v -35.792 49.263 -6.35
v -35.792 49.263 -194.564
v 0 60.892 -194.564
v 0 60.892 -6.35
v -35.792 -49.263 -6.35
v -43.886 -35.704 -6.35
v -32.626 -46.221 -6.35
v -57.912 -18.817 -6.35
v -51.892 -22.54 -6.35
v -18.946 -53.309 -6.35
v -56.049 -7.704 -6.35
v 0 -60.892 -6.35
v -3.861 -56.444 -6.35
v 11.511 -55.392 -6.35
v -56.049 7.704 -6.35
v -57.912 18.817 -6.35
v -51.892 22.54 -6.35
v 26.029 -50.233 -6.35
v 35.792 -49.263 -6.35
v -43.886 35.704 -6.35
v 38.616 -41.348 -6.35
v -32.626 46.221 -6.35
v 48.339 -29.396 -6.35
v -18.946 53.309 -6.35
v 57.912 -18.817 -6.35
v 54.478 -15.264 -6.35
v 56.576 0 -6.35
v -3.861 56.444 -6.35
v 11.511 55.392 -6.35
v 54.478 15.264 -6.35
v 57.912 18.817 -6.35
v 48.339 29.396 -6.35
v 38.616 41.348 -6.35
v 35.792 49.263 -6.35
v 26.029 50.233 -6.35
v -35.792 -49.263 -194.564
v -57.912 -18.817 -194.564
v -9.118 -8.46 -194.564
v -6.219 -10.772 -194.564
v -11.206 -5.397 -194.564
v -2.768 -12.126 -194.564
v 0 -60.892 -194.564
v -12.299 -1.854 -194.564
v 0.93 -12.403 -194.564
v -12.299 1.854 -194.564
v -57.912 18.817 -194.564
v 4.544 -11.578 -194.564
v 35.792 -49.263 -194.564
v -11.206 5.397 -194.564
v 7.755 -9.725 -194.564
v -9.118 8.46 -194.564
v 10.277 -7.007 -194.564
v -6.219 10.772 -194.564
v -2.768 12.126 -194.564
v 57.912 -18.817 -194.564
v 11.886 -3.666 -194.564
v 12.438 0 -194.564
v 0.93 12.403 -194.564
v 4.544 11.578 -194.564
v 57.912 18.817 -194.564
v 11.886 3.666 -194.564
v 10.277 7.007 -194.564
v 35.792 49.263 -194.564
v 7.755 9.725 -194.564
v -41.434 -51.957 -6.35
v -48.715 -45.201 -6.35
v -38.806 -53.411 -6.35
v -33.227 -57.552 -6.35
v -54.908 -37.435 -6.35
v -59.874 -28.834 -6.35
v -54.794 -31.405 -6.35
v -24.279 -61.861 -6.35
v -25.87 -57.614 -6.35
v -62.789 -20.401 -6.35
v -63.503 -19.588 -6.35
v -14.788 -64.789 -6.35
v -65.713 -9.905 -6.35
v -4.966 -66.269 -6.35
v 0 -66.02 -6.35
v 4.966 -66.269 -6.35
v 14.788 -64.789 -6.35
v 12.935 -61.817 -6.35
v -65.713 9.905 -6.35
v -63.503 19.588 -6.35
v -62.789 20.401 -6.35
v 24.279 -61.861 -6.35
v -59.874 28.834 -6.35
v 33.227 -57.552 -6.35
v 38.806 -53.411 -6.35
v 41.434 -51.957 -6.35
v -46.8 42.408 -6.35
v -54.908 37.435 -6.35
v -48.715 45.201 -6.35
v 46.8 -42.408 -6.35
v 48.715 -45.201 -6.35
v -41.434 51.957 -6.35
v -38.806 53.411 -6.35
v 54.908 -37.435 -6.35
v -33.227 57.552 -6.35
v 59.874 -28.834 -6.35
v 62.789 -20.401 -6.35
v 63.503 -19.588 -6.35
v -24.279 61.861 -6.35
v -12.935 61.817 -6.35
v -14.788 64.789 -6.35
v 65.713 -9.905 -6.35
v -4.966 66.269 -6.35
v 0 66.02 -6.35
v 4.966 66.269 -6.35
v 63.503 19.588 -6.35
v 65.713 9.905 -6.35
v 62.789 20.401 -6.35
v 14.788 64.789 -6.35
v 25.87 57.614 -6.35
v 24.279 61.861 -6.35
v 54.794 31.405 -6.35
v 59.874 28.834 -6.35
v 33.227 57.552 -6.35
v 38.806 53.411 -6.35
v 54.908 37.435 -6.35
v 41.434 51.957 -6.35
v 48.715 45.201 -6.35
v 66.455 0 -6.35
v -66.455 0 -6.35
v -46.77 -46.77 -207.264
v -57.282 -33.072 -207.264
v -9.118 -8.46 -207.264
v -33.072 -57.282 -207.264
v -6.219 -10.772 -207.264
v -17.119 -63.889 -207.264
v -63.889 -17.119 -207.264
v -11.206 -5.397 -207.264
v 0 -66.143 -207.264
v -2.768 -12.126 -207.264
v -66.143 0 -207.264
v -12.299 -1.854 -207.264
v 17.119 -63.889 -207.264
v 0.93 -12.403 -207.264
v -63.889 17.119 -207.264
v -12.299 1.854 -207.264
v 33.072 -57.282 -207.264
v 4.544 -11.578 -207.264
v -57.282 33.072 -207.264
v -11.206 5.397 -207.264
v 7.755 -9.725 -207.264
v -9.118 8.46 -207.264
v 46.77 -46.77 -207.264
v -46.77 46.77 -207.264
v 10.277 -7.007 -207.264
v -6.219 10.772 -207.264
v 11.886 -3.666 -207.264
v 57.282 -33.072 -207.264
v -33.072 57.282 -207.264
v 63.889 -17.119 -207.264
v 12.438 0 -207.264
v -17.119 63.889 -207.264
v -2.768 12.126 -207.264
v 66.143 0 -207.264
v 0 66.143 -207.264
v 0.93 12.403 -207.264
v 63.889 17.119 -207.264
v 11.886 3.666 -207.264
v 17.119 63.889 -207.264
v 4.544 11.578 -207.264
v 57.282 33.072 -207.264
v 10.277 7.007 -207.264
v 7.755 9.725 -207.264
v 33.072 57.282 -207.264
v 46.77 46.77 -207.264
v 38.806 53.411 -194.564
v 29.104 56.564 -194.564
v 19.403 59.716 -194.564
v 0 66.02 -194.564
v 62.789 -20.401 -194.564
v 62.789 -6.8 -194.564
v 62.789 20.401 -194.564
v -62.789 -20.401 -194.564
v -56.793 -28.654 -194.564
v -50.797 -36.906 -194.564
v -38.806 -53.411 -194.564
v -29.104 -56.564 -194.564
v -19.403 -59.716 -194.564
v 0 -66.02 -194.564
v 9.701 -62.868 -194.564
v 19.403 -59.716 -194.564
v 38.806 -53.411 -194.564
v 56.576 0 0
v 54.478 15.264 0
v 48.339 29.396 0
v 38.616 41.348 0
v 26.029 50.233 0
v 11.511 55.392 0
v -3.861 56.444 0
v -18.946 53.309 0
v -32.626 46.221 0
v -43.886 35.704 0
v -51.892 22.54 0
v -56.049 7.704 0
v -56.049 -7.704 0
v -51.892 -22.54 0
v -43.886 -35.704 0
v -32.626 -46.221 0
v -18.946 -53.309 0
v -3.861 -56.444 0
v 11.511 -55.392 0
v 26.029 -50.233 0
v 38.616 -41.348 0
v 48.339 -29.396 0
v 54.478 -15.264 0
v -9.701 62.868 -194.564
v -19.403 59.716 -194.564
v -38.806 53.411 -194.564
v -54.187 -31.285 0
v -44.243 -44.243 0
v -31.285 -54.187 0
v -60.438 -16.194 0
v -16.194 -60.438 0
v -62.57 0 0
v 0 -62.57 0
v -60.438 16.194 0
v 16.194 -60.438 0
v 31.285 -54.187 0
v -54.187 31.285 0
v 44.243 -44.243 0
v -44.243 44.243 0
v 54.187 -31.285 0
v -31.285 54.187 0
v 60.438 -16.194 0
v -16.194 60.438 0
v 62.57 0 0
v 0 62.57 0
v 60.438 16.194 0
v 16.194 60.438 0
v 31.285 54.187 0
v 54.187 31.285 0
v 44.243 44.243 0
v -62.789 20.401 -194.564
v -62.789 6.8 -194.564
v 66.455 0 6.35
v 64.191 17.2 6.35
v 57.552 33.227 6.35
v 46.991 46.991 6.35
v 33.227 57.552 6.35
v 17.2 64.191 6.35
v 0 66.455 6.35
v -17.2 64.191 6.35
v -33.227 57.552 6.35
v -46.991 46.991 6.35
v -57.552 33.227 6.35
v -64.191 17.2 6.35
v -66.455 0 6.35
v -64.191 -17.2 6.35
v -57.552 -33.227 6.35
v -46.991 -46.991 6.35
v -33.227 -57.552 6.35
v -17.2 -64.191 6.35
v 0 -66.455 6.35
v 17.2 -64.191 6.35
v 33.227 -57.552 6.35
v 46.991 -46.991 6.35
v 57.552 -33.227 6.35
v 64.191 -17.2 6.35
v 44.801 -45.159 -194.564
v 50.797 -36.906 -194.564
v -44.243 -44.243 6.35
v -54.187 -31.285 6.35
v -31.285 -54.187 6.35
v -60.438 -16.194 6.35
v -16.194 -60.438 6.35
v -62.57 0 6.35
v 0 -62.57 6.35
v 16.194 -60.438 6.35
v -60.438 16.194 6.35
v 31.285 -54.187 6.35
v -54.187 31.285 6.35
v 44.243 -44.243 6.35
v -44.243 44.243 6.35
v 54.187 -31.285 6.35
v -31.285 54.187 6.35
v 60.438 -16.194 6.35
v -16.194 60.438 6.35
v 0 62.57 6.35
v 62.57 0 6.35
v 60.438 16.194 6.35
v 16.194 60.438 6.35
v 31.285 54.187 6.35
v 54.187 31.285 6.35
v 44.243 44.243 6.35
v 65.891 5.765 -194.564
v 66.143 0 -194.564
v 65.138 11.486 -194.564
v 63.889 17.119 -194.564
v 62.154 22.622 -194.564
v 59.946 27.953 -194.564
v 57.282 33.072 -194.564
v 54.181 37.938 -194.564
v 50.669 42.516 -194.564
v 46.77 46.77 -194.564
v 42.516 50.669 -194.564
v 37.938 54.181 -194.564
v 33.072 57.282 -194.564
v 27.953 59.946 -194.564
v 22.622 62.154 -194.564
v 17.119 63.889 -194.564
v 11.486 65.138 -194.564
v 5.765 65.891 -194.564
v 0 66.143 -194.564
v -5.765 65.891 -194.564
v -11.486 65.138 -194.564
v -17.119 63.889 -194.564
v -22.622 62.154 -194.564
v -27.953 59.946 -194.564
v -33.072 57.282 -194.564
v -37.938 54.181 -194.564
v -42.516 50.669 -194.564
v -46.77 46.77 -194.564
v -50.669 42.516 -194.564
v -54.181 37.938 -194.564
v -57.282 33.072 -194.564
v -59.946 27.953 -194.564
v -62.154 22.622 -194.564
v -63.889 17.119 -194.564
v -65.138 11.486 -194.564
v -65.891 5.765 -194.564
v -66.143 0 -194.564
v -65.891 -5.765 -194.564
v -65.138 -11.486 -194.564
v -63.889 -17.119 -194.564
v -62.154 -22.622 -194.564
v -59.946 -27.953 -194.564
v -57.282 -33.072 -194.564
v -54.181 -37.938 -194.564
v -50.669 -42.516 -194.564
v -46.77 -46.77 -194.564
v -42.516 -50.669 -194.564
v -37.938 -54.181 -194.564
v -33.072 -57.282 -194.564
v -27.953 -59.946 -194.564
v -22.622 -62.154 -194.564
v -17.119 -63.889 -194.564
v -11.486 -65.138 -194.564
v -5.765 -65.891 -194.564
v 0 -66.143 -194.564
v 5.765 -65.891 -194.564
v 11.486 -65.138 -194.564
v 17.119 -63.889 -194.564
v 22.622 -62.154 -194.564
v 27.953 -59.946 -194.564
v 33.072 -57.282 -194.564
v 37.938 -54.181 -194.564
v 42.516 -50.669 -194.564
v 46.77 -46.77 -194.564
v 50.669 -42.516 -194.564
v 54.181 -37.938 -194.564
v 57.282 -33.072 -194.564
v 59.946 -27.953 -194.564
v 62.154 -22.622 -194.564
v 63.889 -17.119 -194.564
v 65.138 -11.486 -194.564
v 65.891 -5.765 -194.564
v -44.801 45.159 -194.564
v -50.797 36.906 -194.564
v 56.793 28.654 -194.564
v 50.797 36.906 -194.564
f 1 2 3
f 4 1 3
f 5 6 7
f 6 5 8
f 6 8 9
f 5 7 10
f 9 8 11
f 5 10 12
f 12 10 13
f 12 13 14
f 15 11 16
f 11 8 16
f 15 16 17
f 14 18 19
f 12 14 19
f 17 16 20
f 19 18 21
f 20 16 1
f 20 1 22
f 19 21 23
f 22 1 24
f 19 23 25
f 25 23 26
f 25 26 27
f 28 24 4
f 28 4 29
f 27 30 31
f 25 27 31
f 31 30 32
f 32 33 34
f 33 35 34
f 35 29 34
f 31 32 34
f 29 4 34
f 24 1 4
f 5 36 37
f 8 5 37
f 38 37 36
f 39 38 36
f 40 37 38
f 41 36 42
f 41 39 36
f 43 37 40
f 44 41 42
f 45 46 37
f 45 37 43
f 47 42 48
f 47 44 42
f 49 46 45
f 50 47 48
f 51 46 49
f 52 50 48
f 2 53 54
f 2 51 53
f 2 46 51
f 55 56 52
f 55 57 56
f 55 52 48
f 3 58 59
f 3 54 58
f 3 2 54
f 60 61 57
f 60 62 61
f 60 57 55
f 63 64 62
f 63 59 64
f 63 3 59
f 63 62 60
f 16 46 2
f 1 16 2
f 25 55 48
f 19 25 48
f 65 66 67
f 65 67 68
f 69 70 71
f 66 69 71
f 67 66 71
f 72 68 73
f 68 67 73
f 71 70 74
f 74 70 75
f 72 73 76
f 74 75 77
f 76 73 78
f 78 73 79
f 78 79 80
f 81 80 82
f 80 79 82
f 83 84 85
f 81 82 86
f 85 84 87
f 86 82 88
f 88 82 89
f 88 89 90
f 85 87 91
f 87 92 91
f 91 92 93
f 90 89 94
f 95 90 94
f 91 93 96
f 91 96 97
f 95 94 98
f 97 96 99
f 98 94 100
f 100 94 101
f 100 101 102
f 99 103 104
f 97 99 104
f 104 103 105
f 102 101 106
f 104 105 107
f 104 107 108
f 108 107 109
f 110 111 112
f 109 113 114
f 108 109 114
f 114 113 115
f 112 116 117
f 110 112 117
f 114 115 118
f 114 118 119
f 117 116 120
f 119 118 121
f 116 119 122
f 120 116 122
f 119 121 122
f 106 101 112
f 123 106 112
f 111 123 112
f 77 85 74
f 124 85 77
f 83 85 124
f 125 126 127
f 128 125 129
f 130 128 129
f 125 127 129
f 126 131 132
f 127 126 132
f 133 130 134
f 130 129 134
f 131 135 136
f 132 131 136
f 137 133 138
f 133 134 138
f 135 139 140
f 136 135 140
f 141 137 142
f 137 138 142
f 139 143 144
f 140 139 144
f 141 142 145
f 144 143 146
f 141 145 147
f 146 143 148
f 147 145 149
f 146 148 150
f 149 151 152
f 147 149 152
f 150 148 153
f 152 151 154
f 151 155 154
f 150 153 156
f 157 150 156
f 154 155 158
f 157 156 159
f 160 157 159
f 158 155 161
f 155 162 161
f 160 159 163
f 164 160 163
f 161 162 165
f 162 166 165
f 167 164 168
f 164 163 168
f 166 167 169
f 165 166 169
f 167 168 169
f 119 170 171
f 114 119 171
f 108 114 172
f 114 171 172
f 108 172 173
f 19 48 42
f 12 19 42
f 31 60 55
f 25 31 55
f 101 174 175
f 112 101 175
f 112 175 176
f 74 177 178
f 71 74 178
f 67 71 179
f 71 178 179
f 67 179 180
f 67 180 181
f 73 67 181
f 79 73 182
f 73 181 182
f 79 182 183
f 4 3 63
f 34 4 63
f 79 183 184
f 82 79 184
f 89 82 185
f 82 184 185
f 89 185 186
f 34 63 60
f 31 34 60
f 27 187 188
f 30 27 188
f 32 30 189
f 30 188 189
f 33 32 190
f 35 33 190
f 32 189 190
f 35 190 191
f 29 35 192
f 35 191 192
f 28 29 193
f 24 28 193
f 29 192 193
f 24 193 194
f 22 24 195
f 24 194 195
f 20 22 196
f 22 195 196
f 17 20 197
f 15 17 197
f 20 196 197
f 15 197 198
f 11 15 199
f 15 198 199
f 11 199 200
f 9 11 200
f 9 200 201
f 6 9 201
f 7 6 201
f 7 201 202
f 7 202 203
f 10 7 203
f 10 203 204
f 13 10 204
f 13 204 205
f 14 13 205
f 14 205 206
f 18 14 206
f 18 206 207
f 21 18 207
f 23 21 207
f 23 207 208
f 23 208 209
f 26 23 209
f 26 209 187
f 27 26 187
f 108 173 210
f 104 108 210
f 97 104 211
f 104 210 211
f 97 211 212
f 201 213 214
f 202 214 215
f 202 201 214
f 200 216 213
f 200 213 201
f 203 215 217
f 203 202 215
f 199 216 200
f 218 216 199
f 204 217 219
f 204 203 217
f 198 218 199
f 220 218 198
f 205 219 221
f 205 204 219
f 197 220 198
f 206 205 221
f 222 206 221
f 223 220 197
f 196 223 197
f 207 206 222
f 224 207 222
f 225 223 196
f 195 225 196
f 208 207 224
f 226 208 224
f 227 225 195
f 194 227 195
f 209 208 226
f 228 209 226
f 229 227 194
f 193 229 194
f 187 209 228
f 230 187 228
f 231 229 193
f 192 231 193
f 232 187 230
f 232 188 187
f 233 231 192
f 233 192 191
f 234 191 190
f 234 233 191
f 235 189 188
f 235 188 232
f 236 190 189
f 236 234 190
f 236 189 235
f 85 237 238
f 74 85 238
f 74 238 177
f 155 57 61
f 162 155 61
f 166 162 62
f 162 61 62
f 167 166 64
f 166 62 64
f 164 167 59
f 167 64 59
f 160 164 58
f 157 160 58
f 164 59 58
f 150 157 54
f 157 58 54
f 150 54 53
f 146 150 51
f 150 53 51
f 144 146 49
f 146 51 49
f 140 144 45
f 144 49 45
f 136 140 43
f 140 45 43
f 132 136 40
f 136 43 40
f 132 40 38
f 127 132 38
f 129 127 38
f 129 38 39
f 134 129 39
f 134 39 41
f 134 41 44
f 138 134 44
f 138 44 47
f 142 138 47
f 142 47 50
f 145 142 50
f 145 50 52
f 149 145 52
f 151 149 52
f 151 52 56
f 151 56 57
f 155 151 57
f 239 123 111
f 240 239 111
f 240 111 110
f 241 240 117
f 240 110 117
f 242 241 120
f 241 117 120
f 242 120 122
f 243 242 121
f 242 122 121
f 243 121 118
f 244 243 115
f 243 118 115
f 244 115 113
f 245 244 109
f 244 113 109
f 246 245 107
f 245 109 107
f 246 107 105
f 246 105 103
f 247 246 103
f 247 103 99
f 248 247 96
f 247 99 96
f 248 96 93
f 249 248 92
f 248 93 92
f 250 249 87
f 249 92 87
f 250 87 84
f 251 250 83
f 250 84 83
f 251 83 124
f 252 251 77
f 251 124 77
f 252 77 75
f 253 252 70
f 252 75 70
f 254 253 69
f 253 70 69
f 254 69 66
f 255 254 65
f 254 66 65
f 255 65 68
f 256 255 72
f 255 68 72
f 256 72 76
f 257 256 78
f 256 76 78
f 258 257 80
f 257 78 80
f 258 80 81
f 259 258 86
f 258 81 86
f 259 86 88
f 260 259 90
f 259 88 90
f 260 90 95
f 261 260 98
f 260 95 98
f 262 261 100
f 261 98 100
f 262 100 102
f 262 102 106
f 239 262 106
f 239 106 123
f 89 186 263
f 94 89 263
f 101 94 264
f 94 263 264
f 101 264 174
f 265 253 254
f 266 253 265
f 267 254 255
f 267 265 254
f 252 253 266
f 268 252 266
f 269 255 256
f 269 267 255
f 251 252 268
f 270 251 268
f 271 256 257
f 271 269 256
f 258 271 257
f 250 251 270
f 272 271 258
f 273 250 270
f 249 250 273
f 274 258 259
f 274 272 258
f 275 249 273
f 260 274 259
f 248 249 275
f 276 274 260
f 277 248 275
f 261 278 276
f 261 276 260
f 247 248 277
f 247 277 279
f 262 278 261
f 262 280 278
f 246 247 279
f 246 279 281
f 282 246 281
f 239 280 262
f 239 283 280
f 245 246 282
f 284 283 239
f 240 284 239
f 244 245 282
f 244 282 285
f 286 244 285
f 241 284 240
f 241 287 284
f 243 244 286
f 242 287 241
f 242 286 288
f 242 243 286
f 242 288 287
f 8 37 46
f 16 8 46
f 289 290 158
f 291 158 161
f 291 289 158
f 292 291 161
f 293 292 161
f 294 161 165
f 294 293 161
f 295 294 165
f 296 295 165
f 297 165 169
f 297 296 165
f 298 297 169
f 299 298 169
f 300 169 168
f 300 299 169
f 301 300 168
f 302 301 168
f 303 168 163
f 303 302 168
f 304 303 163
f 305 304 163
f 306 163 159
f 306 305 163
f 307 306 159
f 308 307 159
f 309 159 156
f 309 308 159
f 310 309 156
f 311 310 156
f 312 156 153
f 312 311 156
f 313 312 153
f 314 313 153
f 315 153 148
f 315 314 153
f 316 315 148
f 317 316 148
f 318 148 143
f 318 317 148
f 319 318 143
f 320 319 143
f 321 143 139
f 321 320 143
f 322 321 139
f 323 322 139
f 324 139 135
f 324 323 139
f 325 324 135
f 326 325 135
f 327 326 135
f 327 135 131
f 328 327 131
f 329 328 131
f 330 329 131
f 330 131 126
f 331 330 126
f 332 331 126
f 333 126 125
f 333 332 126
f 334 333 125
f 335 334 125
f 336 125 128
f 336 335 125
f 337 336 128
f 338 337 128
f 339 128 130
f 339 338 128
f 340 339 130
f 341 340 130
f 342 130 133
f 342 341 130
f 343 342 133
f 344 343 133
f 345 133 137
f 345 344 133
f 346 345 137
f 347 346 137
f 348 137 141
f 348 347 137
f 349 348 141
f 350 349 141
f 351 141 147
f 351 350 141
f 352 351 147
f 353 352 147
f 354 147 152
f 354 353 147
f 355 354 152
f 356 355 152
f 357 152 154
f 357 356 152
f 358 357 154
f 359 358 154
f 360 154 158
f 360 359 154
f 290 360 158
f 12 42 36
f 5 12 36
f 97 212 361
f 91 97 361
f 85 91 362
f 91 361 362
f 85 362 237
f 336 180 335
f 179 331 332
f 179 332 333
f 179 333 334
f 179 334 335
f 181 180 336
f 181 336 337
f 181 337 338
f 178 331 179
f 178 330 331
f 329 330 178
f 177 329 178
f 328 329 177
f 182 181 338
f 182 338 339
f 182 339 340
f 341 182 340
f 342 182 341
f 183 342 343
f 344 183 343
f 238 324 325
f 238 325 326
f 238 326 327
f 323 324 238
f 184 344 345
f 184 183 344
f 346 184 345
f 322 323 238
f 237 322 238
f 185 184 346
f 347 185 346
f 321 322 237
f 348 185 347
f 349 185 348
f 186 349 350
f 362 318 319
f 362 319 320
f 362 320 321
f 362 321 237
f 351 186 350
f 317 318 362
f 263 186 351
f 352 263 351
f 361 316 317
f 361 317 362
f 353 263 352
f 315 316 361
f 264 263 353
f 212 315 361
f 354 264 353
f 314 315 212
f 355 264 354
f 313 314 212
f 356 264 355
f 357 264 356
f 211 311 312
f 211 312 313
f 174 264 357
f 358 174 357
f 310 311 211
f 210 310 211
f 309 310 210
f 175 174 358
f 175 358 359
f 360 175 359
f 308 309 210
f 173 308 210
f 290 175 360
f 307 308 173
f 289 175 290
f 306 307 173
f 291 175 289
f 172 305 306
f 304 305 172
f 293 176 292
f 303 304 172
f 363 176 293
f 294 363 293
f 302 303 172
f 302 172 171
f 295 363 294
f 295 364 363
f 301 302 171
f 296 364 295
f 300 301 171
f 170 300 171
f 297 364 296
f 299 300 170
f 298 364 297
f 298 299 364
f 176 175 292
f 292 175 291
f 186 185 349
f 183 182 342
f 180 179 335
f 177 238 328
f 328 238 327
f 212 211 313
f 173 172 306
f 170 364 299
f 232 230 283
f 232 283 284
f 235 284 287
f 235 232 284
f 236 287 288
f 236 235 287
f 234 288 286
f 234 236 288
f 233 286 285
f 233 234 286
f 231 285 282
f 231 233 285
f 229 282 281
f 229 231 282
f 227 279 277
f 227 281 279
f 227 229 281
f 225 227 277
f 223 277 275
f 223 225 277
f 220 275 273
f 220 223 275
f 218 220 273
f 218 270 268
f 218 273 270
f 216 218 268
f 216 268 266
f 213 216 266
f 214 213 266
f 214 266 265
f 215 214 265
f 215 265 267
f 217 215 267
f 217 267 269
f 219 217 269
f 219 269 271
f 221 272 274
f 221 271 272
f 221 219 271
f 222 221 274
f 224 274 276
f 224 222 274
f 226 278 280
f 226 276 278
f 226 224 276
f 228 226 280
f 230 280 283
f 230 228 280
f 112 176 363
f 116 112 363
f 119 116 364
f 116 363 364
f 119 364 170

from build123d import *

# Parameters (mm, degrees)
F1_DEPTH  = 188.214
F2_R      = 66.1431803404
F3_DEPTH  = 12.7
F5_R      = 66.454962085
F6_DEPTH  = 12.7
F8_R      = 62.5696194111
F9_DEPTH  = 25.4
F10_R     = 56.575713998
F11_DEPTH = 25.4
F13_R     = 12.4381186973
F14_DEPTH = 25.4


with BuildPart() as f1:
    # F0 (on Top) → F1 (new body)
    with BuildSketch(Plane.XY):
        Polygon((62.7887994051, -20.4013176295), (62.7887994051, 20.4013176295), (38.8056121451, 53.4113429694), (0, 66.0200506797), (-38.8056121451, 53.4113429694), (-62.7887994051, 20.4013176295), (-62.7887994051, -20.4013176295), (-38.8056121451, -53.4113429694), (0, -66.0200506797), (38.8056121451, -53.4113429694), align=None)
        Polygon((35.7915863644, 49.262892377), (57.9120032489, 18.8167505039), (57.9120032489, -18.8167505039), (35.7915863644, -49.262892377), (0, -60.8922837462), (-35.7915863644, -49.262892377), (-57.9120032489, -18.8167505039), (-57.9120032489, 18.8167505039), (-35.7915863644, 49.262892377), (0, 60.8922837462), align=None, mode=Mode.SUBTRACT)
    extrude(amount=F1_DEPTH)

    # F2 (on Top) → F3 (join)
    with BuildSketch(Plane.XY):
        Circle(F2_R)
    extrude(amount=-F3_DEPTH)


with BuildPart() as f1_1:
    # F4: moved
    add(f1.part.moved(Location((0, 0, -188.214))))

    # F5 (on Top) → F6 (join)
    with BuildSketch(Plane.XY):
        Circle(F5_R)
    extrude(amount=F6_DEPTH)


with BuildPart() as f1_2:
    # F7: moved
    add(f1_1.part.moved(Location((0, 0, -6.35))))

    # F8 (on Top) → F9 (cut)
    with BuildSketch(Plane.XY):
        Circle(F8_R)
    extrude(amount=F9_DEPTH, mode=Mode.SUBTRACT)

    # F10 (on Top) → F11 (cut)
    with BuildSketch(Plane.XY):
        Circle(F10_R)
    extrude(amount=-F11_DEPTH, mode=Mode.SUBTRACT)


with BuildPart() as f1_3:
    # F12: moved
    add(f1_2.part.moved(Location((0, 0, 194.564))))

    # F13 (on Top) → F14 (cut)
    with BuildSketch(Plane.XY):
        Circle(F13_R)
    extrude(amount=-F14_DEPTH, mode=Mode.SUBTRACT)


with BuildPart() as f1_4:
    # F15: moved
    add(f1_3.part.moved(Location((0, 0, -194.564))))


solid = f1_4.part
